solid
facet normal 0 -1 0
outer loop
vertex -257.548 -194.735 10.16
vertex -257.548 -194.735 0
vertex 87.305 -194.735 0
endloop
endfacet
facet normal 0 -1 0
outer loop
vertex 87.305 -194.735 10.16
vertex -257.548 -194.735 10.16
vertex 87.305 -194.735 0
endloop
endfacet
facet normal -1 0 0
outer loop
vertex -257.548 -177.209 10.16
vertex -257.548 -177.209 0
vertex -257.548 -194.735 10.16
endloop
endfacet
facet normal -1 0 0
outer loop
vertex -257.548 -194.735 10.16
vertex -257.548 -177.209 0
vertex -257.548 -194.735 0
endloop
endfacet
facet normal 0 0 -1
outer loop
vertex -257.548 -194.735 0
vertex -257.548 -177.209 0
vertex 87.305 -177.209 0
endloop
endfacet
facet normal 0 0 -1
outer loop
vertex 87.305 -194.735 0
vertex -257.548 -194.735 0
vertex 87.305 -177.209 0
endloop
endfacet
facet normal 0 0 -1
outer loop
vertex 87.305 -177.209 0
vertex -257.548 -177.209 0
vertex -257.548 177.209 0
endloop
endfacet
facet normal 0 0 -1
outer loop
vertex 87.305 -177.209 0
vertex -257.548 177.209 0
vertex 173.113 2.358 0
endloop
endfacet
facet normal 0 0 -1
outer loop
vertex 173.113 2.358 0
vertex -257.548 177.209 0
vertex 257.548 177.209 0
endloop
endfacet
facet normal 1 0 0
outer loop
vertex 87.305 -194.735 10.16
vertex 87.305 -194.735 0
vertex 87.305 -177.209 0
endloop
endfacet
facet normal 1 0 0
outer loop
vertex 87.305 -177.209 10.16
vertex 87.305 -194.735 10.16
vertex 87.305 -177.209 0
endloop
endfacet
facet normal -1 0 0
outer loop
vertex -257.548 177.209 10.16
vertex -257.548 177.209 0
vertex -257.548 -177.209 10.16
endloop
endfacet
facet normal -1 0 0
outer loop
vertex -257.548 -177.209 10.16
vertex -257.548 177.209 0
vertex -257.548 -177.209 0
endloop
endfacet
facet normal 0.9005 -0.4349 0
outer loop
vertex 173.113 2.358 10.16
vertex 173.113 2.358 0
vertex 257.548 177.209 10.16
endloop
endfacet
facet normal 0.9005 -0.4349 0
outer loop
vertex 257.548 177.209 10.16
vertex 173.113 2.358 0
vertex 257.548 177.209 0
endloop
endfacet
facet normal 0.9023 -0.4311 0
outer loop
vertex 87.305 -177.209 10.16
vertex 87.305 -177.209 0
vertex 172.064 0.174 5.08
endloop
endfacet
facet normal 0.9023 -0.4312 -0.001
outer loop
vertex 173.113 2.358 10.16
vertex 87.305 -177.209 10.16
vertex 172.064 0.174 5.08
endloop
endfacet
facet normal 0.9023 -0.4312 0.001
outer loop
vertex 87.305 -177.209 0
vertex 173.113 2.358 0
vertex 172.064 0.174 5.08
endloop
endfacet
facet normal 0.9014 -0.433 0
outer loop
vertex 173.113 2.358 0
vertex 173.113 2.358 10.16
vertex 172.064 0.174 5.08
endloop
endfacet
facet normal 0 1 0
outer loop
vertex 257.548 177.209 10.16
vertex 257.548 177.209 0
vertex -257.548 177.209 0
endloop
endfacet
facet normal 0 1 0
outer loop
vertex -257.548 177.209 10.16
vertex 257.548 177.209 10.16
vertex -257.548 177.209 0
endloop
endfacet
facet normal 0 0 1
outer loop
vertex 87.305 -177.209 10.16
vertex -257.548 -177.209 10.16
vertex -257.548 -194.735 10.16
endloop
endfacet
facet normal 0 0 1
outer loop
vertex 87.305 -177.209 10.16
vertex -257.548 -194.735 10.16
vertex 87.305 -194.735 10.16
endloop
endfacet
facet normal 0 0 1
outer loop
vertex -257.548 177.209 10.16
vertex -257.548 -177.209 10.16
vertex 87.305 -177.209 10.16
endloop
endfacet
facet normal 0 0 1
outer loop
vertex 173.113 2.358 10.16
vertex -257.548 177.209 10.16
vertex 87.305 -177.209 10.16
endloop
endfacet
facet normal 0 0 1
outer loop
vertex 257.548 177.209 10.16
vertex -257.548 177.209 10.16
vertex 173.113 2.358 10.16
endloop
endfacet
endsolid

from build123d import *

# Parameters (mm, degrees)
BOSS_EXTRUDE2_DEPTH = 10.16


with BuildPart() as part:
    # Sketch1 → Boss-Extrude2 (new body)
    with BuildSketch(Plane.XY):
        with BuildLine():
            Line((257.548254828, 177.209298992), (-257.548120057, 177.209396927))
            Line((-257.548120057, 177.209396927), (-257.548187443, -177.20933136))
            Line((-257.548187443, -177.20933136), (-257.548187443, -194.73533136))
            Line((-257.548187443, -194.73533136), (87.305464804, -194.73533136))
            Line((87.305464804, -194.73533136), (87.305464804, -177.209396927))
            add(Edge.make_bspline(
                [(87.305464804, -177.209396927), (115.443687234, -118.026720576), (143.693138312, -58.89727283), (200.435070064, 59.245320553), (228.928258607, 118.258075422), (257.548254828, 177.209298992)],
                knots=[0, 0, 0, 0, 0.5, 0.5, 1, 1, 1, 1], degree=3))
        make_face()
    extrude(amount=BOSS_EXTRUDE2_DEPTH)


solid = part.part
